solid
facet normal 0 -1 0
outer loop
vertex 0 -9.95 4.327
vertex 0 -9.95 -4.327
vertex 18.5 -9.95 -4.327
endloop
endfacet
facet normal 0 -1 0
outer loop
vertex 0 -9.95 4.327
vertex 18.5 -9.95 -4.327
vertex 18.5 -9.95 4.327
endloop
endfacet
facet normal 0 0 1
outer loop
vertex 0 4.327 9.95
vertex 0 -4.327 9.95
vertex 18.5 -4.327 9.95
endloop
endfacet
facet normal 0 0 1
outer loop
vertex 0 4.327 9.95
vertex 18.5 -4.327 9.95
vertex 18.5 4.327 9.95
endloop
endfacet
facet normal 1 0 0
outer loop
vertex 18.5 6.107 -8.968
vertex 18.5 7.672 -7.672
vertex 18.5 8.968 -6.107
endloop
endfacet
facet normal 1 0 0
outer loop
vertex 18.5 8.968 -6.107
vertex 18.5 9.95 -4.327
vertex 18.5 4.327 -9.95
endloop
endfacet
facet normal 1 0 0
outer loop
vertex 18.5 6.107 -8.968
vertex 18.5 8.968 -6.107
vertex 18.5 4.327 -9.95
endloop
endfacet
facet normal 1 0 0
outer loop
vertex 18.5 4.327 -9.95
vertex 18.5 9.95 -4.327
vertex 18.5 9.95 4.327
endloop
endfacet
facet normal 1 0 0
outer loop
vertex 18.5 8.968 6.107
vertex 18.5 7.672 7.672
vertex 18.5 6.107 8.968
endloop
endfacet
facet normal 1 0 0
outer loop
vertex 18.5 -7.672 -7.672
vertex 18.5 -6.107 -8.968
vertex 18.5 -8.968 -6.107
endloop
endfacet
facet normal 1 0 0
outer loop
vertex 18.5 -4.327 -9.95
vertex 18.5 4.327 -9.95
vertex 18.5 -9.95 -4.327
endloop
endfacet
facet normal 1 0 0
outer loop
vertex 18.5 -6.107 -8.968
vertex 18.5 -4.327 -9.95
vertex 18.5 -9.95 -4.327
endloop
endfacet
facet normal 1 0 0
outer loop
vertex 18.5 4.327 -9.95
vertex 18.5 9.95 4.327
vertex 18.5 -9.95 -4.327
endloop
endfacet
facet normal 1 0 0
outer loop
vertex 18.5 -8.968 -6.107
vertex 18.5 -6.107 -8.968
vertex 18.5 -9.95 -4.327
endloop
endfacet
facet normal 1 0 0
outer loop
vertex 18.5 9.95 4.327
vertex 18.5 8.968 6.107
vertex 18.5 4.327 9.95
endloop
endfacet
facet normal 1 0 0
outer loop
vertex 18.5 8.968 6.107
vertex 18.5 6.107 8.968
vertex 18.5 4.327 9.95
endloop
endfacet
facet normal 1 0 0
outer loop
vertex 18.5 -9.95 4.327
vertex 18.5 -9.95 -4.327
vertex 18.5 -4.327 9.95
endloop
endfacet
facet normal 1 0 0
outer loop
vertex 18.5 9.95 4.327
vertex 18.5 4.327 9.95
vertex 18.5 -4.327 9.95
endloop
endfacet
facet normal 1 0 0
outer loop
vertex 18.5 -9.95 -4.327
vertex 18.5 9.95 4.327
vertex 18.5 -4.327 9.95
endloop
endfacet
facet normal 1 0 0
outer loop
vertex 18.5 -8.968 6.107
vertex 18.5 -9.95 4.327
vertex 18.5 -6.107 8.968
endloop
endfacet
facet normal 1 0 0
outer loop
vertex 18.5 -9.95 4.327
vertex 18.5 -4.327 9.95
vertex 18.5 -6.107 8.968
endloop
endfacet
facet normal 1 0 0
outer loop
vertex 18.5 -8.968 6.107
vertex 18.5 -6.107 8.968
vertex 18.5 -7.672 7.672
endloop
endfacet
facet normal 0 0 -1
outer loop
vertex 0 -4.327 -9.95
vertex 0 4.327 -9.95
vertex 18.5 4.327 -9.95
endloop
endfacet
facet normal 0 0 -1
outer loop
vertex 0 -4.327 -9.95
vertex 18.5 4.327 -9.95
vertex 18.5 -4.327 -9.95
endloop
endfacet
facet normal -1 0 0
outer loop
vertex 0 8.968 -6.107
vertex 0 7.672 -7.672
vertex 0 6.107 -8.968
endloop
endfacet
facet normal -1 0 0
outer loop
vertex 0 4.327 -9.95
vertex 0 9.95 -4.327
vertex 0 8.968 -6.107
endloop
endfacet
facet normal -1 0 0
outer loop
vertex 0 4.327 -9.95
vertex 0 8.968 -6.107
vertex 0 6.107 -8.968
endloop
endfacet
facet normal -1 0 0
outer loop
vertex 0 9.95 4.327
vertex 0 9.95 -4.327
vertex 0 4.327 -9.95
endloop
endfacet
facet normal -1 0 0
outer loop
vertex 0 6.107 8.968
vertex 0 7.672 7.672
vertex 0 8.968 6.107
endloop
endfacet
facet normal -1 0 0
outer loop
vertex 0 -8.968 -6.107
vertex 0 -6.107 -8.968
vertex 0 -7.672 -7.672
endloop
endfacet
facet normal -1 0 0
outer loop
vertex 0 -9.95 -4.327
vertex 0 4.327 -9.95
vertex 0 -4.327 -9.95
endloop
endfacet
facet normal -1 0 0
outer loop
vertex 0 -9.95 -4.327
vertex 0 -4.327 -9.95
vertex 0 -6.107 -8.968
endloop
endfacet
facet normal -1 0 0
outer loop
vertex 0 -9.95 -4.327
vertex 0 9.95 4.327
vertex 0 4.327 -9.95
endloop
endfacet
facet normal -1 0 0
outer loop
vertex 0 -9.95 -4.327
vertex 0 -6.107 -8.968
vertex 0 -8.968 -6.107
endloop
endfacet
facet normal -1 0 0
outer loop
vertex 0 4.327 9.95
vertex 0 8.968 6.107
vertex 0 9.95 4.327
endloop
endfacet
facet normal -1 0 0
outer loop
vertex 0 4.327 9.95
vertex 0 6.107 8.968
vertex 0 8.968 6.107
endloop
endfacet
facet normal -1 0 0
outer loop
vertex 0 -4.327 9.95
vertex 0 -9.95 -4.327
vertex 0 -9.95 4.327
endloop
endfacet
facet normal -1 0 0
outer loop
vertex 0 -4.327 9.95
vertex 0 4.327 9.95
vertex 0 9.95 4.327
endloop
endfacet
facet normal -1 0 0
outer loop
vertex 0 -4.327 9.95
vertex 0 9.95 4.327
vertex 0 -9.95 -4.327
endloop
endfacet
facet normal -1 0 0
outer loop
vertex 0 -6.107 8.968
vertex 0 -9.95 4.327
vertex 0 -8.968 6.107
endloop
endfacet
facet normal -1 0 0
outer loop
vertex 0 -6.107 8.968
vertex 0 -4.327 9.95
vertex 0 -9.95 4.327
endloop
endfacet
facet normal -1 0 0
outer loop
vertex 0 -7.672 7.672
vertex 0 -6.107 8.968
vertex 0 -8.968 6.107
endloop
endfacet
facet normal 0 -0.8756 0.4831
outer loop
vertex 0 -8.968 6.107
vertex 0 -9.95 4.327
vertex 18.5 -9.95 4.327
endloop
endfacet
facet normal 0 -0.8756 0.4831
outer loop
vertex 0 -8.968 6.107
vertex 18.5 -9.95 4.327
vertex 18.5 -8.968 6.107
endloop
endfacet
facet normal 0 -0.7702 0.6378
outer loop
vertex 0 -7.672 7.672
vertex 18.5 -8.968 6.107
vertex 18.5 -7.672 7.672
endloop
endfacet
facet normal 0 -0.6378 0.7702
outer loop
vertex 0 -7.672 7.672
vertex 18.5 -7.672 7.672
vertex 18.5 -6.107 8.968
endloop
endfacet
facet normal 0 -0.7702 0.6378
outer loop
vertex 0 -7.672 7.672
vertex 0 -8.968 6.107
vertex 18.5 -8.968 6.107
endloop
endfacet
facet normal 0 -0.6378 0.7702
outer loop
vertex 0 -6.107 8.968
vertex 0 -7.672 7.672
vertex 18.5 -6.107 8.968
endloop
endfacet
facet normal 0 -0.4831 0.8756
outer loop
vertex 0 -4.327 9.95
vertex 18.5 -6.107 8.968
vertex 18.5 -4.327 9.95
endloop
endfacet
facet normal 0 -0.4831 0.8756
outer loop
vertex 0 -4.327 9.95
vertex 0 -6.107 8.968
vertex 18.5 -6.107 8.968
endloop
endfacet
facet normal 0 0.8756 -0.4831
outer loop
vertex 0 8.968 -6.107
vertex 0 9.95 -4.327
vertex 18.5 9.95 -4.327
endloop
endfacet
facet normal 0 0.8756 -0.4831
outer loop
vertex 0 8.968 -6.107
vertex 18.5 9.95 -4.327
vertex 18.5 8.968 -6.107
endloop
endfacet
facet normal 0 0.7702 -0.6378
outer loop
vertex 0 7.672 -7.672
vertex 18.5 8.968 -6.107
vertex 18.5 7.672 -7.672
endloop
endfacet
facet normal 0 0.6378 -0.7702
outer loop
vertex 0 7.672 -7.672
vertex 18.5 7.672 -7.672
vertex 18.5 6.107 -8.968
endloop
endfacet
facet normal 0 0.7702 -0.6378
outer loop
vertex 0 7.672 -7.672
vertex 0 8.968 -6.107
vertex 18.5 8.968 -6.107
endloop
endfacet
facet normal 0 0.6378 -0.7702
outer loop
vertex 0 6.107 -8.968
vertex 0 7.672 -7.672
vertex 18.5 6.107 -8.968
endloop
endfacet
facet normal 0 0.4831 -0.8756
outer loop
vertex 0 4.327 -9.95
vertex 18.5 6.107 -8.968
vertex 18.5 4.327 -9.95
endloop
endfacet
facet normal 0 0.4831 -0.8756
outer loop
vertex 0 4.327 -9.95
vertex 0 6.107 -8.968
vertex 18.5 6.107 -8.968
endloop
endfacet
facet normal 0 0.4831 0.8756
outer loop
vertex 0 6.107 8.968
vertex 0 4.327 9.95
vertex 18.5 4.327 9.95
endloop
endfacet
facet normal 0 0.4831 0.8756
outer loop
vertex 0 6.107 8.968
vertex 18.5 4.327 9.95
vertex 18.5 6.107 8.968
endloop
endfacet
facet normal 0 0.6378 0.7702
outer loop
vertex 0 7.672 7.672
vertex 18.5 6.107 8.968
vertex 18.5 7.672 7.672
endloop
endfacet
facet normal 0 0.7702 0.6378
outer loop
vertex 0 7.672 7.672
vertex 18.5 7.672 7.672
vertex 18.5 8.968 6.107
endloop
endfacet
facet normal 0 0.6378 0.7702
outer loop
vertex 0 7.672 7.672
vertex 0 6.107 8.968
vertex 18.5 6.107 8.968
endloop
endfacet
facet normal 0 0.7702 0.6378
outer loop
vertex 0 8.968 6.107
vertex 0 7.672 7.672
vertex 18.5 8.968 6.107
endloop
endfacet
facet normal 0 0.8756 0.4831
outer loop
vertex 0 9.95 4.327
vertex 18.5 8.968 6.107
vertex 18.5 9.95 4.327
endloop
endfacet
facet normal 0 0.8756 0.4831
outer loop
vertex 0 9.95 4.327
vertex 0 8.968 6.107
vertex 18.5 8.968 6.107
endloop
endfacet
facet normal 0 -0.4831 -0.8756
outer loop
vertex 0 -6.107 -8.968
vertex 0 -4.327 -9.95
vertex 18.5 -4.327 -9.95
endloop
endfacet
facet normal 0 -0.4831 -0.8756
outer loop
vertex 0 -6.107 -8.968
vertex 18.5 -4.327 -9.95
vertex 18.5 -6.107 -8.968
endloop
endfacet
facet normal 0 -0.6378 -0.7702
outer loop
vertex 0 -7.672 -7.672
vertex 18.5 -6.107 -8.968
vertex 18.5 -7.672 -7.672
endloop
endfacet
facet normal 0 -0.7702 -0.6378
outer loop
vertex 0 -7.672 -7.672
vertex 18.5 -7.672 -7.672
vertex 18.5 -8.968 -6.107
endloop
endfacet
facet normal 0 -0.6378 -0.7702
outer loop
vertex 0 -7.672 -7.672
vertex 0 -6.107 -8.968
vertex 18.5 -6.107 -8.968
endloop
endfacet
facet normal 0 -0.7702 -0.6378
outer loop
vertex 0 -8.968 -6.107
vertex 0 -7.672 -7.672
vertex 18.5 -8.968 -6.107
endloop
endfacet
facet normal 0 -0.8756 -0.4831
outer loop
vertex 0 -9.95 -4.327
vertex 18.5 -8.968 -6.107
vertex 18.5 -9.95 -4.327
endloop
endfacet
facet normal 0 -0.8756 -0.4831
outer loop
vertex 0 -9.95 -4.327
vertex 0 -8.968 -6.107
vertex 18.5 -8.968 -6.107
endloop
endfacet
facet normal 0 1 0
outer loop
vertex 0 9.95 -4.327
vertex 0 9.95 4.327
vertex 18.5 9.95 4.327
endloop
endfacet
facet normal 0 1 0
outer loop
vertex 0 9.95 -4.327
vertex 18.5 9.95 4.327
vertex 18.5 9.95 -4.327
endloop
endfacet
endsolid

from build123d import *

# Parameters (mm, degrees)
BOSS_EXTRUDE1_DEPTH = 18.5


with BuildPart() as part:
    # Sketch1 → Boss-Extrude1 (new body)
    with BuildSketch(Plane.YZ):
        with BuildLine():
            Line((-4.326661531, 9.95), (4.326661531, 9.95))
            ThreePointArc((4.326661531, 9.95), (7.672108576, 7.672108576), (9.95, 4.326661531))
            Line((9.95, 4.326661531), (9.95, -4.326661531))
            ThreePointArc((9.95, -4.326661531), (7.672108576, -7.672108576), (4.326661531, -9.95))
            Line((4.326661531, -9.95), (-4.326661531, -9.95))
            ThreePointArc((-4.326661531, -9.95), (-7.672108576, -7.672108576), (-9.95, -4.326661531))
            Line((-9.95, -4.326661531), (-9.95, 4.326661531))
            ThreePointArc((-9.95, 4.326661531), (-7.672108576, 7.672108576), (-4.326661531, 9.95))
        make_face()
    extrude(amount=BOSS_EXTRUDE1_DEPTH)


solid = part.part
